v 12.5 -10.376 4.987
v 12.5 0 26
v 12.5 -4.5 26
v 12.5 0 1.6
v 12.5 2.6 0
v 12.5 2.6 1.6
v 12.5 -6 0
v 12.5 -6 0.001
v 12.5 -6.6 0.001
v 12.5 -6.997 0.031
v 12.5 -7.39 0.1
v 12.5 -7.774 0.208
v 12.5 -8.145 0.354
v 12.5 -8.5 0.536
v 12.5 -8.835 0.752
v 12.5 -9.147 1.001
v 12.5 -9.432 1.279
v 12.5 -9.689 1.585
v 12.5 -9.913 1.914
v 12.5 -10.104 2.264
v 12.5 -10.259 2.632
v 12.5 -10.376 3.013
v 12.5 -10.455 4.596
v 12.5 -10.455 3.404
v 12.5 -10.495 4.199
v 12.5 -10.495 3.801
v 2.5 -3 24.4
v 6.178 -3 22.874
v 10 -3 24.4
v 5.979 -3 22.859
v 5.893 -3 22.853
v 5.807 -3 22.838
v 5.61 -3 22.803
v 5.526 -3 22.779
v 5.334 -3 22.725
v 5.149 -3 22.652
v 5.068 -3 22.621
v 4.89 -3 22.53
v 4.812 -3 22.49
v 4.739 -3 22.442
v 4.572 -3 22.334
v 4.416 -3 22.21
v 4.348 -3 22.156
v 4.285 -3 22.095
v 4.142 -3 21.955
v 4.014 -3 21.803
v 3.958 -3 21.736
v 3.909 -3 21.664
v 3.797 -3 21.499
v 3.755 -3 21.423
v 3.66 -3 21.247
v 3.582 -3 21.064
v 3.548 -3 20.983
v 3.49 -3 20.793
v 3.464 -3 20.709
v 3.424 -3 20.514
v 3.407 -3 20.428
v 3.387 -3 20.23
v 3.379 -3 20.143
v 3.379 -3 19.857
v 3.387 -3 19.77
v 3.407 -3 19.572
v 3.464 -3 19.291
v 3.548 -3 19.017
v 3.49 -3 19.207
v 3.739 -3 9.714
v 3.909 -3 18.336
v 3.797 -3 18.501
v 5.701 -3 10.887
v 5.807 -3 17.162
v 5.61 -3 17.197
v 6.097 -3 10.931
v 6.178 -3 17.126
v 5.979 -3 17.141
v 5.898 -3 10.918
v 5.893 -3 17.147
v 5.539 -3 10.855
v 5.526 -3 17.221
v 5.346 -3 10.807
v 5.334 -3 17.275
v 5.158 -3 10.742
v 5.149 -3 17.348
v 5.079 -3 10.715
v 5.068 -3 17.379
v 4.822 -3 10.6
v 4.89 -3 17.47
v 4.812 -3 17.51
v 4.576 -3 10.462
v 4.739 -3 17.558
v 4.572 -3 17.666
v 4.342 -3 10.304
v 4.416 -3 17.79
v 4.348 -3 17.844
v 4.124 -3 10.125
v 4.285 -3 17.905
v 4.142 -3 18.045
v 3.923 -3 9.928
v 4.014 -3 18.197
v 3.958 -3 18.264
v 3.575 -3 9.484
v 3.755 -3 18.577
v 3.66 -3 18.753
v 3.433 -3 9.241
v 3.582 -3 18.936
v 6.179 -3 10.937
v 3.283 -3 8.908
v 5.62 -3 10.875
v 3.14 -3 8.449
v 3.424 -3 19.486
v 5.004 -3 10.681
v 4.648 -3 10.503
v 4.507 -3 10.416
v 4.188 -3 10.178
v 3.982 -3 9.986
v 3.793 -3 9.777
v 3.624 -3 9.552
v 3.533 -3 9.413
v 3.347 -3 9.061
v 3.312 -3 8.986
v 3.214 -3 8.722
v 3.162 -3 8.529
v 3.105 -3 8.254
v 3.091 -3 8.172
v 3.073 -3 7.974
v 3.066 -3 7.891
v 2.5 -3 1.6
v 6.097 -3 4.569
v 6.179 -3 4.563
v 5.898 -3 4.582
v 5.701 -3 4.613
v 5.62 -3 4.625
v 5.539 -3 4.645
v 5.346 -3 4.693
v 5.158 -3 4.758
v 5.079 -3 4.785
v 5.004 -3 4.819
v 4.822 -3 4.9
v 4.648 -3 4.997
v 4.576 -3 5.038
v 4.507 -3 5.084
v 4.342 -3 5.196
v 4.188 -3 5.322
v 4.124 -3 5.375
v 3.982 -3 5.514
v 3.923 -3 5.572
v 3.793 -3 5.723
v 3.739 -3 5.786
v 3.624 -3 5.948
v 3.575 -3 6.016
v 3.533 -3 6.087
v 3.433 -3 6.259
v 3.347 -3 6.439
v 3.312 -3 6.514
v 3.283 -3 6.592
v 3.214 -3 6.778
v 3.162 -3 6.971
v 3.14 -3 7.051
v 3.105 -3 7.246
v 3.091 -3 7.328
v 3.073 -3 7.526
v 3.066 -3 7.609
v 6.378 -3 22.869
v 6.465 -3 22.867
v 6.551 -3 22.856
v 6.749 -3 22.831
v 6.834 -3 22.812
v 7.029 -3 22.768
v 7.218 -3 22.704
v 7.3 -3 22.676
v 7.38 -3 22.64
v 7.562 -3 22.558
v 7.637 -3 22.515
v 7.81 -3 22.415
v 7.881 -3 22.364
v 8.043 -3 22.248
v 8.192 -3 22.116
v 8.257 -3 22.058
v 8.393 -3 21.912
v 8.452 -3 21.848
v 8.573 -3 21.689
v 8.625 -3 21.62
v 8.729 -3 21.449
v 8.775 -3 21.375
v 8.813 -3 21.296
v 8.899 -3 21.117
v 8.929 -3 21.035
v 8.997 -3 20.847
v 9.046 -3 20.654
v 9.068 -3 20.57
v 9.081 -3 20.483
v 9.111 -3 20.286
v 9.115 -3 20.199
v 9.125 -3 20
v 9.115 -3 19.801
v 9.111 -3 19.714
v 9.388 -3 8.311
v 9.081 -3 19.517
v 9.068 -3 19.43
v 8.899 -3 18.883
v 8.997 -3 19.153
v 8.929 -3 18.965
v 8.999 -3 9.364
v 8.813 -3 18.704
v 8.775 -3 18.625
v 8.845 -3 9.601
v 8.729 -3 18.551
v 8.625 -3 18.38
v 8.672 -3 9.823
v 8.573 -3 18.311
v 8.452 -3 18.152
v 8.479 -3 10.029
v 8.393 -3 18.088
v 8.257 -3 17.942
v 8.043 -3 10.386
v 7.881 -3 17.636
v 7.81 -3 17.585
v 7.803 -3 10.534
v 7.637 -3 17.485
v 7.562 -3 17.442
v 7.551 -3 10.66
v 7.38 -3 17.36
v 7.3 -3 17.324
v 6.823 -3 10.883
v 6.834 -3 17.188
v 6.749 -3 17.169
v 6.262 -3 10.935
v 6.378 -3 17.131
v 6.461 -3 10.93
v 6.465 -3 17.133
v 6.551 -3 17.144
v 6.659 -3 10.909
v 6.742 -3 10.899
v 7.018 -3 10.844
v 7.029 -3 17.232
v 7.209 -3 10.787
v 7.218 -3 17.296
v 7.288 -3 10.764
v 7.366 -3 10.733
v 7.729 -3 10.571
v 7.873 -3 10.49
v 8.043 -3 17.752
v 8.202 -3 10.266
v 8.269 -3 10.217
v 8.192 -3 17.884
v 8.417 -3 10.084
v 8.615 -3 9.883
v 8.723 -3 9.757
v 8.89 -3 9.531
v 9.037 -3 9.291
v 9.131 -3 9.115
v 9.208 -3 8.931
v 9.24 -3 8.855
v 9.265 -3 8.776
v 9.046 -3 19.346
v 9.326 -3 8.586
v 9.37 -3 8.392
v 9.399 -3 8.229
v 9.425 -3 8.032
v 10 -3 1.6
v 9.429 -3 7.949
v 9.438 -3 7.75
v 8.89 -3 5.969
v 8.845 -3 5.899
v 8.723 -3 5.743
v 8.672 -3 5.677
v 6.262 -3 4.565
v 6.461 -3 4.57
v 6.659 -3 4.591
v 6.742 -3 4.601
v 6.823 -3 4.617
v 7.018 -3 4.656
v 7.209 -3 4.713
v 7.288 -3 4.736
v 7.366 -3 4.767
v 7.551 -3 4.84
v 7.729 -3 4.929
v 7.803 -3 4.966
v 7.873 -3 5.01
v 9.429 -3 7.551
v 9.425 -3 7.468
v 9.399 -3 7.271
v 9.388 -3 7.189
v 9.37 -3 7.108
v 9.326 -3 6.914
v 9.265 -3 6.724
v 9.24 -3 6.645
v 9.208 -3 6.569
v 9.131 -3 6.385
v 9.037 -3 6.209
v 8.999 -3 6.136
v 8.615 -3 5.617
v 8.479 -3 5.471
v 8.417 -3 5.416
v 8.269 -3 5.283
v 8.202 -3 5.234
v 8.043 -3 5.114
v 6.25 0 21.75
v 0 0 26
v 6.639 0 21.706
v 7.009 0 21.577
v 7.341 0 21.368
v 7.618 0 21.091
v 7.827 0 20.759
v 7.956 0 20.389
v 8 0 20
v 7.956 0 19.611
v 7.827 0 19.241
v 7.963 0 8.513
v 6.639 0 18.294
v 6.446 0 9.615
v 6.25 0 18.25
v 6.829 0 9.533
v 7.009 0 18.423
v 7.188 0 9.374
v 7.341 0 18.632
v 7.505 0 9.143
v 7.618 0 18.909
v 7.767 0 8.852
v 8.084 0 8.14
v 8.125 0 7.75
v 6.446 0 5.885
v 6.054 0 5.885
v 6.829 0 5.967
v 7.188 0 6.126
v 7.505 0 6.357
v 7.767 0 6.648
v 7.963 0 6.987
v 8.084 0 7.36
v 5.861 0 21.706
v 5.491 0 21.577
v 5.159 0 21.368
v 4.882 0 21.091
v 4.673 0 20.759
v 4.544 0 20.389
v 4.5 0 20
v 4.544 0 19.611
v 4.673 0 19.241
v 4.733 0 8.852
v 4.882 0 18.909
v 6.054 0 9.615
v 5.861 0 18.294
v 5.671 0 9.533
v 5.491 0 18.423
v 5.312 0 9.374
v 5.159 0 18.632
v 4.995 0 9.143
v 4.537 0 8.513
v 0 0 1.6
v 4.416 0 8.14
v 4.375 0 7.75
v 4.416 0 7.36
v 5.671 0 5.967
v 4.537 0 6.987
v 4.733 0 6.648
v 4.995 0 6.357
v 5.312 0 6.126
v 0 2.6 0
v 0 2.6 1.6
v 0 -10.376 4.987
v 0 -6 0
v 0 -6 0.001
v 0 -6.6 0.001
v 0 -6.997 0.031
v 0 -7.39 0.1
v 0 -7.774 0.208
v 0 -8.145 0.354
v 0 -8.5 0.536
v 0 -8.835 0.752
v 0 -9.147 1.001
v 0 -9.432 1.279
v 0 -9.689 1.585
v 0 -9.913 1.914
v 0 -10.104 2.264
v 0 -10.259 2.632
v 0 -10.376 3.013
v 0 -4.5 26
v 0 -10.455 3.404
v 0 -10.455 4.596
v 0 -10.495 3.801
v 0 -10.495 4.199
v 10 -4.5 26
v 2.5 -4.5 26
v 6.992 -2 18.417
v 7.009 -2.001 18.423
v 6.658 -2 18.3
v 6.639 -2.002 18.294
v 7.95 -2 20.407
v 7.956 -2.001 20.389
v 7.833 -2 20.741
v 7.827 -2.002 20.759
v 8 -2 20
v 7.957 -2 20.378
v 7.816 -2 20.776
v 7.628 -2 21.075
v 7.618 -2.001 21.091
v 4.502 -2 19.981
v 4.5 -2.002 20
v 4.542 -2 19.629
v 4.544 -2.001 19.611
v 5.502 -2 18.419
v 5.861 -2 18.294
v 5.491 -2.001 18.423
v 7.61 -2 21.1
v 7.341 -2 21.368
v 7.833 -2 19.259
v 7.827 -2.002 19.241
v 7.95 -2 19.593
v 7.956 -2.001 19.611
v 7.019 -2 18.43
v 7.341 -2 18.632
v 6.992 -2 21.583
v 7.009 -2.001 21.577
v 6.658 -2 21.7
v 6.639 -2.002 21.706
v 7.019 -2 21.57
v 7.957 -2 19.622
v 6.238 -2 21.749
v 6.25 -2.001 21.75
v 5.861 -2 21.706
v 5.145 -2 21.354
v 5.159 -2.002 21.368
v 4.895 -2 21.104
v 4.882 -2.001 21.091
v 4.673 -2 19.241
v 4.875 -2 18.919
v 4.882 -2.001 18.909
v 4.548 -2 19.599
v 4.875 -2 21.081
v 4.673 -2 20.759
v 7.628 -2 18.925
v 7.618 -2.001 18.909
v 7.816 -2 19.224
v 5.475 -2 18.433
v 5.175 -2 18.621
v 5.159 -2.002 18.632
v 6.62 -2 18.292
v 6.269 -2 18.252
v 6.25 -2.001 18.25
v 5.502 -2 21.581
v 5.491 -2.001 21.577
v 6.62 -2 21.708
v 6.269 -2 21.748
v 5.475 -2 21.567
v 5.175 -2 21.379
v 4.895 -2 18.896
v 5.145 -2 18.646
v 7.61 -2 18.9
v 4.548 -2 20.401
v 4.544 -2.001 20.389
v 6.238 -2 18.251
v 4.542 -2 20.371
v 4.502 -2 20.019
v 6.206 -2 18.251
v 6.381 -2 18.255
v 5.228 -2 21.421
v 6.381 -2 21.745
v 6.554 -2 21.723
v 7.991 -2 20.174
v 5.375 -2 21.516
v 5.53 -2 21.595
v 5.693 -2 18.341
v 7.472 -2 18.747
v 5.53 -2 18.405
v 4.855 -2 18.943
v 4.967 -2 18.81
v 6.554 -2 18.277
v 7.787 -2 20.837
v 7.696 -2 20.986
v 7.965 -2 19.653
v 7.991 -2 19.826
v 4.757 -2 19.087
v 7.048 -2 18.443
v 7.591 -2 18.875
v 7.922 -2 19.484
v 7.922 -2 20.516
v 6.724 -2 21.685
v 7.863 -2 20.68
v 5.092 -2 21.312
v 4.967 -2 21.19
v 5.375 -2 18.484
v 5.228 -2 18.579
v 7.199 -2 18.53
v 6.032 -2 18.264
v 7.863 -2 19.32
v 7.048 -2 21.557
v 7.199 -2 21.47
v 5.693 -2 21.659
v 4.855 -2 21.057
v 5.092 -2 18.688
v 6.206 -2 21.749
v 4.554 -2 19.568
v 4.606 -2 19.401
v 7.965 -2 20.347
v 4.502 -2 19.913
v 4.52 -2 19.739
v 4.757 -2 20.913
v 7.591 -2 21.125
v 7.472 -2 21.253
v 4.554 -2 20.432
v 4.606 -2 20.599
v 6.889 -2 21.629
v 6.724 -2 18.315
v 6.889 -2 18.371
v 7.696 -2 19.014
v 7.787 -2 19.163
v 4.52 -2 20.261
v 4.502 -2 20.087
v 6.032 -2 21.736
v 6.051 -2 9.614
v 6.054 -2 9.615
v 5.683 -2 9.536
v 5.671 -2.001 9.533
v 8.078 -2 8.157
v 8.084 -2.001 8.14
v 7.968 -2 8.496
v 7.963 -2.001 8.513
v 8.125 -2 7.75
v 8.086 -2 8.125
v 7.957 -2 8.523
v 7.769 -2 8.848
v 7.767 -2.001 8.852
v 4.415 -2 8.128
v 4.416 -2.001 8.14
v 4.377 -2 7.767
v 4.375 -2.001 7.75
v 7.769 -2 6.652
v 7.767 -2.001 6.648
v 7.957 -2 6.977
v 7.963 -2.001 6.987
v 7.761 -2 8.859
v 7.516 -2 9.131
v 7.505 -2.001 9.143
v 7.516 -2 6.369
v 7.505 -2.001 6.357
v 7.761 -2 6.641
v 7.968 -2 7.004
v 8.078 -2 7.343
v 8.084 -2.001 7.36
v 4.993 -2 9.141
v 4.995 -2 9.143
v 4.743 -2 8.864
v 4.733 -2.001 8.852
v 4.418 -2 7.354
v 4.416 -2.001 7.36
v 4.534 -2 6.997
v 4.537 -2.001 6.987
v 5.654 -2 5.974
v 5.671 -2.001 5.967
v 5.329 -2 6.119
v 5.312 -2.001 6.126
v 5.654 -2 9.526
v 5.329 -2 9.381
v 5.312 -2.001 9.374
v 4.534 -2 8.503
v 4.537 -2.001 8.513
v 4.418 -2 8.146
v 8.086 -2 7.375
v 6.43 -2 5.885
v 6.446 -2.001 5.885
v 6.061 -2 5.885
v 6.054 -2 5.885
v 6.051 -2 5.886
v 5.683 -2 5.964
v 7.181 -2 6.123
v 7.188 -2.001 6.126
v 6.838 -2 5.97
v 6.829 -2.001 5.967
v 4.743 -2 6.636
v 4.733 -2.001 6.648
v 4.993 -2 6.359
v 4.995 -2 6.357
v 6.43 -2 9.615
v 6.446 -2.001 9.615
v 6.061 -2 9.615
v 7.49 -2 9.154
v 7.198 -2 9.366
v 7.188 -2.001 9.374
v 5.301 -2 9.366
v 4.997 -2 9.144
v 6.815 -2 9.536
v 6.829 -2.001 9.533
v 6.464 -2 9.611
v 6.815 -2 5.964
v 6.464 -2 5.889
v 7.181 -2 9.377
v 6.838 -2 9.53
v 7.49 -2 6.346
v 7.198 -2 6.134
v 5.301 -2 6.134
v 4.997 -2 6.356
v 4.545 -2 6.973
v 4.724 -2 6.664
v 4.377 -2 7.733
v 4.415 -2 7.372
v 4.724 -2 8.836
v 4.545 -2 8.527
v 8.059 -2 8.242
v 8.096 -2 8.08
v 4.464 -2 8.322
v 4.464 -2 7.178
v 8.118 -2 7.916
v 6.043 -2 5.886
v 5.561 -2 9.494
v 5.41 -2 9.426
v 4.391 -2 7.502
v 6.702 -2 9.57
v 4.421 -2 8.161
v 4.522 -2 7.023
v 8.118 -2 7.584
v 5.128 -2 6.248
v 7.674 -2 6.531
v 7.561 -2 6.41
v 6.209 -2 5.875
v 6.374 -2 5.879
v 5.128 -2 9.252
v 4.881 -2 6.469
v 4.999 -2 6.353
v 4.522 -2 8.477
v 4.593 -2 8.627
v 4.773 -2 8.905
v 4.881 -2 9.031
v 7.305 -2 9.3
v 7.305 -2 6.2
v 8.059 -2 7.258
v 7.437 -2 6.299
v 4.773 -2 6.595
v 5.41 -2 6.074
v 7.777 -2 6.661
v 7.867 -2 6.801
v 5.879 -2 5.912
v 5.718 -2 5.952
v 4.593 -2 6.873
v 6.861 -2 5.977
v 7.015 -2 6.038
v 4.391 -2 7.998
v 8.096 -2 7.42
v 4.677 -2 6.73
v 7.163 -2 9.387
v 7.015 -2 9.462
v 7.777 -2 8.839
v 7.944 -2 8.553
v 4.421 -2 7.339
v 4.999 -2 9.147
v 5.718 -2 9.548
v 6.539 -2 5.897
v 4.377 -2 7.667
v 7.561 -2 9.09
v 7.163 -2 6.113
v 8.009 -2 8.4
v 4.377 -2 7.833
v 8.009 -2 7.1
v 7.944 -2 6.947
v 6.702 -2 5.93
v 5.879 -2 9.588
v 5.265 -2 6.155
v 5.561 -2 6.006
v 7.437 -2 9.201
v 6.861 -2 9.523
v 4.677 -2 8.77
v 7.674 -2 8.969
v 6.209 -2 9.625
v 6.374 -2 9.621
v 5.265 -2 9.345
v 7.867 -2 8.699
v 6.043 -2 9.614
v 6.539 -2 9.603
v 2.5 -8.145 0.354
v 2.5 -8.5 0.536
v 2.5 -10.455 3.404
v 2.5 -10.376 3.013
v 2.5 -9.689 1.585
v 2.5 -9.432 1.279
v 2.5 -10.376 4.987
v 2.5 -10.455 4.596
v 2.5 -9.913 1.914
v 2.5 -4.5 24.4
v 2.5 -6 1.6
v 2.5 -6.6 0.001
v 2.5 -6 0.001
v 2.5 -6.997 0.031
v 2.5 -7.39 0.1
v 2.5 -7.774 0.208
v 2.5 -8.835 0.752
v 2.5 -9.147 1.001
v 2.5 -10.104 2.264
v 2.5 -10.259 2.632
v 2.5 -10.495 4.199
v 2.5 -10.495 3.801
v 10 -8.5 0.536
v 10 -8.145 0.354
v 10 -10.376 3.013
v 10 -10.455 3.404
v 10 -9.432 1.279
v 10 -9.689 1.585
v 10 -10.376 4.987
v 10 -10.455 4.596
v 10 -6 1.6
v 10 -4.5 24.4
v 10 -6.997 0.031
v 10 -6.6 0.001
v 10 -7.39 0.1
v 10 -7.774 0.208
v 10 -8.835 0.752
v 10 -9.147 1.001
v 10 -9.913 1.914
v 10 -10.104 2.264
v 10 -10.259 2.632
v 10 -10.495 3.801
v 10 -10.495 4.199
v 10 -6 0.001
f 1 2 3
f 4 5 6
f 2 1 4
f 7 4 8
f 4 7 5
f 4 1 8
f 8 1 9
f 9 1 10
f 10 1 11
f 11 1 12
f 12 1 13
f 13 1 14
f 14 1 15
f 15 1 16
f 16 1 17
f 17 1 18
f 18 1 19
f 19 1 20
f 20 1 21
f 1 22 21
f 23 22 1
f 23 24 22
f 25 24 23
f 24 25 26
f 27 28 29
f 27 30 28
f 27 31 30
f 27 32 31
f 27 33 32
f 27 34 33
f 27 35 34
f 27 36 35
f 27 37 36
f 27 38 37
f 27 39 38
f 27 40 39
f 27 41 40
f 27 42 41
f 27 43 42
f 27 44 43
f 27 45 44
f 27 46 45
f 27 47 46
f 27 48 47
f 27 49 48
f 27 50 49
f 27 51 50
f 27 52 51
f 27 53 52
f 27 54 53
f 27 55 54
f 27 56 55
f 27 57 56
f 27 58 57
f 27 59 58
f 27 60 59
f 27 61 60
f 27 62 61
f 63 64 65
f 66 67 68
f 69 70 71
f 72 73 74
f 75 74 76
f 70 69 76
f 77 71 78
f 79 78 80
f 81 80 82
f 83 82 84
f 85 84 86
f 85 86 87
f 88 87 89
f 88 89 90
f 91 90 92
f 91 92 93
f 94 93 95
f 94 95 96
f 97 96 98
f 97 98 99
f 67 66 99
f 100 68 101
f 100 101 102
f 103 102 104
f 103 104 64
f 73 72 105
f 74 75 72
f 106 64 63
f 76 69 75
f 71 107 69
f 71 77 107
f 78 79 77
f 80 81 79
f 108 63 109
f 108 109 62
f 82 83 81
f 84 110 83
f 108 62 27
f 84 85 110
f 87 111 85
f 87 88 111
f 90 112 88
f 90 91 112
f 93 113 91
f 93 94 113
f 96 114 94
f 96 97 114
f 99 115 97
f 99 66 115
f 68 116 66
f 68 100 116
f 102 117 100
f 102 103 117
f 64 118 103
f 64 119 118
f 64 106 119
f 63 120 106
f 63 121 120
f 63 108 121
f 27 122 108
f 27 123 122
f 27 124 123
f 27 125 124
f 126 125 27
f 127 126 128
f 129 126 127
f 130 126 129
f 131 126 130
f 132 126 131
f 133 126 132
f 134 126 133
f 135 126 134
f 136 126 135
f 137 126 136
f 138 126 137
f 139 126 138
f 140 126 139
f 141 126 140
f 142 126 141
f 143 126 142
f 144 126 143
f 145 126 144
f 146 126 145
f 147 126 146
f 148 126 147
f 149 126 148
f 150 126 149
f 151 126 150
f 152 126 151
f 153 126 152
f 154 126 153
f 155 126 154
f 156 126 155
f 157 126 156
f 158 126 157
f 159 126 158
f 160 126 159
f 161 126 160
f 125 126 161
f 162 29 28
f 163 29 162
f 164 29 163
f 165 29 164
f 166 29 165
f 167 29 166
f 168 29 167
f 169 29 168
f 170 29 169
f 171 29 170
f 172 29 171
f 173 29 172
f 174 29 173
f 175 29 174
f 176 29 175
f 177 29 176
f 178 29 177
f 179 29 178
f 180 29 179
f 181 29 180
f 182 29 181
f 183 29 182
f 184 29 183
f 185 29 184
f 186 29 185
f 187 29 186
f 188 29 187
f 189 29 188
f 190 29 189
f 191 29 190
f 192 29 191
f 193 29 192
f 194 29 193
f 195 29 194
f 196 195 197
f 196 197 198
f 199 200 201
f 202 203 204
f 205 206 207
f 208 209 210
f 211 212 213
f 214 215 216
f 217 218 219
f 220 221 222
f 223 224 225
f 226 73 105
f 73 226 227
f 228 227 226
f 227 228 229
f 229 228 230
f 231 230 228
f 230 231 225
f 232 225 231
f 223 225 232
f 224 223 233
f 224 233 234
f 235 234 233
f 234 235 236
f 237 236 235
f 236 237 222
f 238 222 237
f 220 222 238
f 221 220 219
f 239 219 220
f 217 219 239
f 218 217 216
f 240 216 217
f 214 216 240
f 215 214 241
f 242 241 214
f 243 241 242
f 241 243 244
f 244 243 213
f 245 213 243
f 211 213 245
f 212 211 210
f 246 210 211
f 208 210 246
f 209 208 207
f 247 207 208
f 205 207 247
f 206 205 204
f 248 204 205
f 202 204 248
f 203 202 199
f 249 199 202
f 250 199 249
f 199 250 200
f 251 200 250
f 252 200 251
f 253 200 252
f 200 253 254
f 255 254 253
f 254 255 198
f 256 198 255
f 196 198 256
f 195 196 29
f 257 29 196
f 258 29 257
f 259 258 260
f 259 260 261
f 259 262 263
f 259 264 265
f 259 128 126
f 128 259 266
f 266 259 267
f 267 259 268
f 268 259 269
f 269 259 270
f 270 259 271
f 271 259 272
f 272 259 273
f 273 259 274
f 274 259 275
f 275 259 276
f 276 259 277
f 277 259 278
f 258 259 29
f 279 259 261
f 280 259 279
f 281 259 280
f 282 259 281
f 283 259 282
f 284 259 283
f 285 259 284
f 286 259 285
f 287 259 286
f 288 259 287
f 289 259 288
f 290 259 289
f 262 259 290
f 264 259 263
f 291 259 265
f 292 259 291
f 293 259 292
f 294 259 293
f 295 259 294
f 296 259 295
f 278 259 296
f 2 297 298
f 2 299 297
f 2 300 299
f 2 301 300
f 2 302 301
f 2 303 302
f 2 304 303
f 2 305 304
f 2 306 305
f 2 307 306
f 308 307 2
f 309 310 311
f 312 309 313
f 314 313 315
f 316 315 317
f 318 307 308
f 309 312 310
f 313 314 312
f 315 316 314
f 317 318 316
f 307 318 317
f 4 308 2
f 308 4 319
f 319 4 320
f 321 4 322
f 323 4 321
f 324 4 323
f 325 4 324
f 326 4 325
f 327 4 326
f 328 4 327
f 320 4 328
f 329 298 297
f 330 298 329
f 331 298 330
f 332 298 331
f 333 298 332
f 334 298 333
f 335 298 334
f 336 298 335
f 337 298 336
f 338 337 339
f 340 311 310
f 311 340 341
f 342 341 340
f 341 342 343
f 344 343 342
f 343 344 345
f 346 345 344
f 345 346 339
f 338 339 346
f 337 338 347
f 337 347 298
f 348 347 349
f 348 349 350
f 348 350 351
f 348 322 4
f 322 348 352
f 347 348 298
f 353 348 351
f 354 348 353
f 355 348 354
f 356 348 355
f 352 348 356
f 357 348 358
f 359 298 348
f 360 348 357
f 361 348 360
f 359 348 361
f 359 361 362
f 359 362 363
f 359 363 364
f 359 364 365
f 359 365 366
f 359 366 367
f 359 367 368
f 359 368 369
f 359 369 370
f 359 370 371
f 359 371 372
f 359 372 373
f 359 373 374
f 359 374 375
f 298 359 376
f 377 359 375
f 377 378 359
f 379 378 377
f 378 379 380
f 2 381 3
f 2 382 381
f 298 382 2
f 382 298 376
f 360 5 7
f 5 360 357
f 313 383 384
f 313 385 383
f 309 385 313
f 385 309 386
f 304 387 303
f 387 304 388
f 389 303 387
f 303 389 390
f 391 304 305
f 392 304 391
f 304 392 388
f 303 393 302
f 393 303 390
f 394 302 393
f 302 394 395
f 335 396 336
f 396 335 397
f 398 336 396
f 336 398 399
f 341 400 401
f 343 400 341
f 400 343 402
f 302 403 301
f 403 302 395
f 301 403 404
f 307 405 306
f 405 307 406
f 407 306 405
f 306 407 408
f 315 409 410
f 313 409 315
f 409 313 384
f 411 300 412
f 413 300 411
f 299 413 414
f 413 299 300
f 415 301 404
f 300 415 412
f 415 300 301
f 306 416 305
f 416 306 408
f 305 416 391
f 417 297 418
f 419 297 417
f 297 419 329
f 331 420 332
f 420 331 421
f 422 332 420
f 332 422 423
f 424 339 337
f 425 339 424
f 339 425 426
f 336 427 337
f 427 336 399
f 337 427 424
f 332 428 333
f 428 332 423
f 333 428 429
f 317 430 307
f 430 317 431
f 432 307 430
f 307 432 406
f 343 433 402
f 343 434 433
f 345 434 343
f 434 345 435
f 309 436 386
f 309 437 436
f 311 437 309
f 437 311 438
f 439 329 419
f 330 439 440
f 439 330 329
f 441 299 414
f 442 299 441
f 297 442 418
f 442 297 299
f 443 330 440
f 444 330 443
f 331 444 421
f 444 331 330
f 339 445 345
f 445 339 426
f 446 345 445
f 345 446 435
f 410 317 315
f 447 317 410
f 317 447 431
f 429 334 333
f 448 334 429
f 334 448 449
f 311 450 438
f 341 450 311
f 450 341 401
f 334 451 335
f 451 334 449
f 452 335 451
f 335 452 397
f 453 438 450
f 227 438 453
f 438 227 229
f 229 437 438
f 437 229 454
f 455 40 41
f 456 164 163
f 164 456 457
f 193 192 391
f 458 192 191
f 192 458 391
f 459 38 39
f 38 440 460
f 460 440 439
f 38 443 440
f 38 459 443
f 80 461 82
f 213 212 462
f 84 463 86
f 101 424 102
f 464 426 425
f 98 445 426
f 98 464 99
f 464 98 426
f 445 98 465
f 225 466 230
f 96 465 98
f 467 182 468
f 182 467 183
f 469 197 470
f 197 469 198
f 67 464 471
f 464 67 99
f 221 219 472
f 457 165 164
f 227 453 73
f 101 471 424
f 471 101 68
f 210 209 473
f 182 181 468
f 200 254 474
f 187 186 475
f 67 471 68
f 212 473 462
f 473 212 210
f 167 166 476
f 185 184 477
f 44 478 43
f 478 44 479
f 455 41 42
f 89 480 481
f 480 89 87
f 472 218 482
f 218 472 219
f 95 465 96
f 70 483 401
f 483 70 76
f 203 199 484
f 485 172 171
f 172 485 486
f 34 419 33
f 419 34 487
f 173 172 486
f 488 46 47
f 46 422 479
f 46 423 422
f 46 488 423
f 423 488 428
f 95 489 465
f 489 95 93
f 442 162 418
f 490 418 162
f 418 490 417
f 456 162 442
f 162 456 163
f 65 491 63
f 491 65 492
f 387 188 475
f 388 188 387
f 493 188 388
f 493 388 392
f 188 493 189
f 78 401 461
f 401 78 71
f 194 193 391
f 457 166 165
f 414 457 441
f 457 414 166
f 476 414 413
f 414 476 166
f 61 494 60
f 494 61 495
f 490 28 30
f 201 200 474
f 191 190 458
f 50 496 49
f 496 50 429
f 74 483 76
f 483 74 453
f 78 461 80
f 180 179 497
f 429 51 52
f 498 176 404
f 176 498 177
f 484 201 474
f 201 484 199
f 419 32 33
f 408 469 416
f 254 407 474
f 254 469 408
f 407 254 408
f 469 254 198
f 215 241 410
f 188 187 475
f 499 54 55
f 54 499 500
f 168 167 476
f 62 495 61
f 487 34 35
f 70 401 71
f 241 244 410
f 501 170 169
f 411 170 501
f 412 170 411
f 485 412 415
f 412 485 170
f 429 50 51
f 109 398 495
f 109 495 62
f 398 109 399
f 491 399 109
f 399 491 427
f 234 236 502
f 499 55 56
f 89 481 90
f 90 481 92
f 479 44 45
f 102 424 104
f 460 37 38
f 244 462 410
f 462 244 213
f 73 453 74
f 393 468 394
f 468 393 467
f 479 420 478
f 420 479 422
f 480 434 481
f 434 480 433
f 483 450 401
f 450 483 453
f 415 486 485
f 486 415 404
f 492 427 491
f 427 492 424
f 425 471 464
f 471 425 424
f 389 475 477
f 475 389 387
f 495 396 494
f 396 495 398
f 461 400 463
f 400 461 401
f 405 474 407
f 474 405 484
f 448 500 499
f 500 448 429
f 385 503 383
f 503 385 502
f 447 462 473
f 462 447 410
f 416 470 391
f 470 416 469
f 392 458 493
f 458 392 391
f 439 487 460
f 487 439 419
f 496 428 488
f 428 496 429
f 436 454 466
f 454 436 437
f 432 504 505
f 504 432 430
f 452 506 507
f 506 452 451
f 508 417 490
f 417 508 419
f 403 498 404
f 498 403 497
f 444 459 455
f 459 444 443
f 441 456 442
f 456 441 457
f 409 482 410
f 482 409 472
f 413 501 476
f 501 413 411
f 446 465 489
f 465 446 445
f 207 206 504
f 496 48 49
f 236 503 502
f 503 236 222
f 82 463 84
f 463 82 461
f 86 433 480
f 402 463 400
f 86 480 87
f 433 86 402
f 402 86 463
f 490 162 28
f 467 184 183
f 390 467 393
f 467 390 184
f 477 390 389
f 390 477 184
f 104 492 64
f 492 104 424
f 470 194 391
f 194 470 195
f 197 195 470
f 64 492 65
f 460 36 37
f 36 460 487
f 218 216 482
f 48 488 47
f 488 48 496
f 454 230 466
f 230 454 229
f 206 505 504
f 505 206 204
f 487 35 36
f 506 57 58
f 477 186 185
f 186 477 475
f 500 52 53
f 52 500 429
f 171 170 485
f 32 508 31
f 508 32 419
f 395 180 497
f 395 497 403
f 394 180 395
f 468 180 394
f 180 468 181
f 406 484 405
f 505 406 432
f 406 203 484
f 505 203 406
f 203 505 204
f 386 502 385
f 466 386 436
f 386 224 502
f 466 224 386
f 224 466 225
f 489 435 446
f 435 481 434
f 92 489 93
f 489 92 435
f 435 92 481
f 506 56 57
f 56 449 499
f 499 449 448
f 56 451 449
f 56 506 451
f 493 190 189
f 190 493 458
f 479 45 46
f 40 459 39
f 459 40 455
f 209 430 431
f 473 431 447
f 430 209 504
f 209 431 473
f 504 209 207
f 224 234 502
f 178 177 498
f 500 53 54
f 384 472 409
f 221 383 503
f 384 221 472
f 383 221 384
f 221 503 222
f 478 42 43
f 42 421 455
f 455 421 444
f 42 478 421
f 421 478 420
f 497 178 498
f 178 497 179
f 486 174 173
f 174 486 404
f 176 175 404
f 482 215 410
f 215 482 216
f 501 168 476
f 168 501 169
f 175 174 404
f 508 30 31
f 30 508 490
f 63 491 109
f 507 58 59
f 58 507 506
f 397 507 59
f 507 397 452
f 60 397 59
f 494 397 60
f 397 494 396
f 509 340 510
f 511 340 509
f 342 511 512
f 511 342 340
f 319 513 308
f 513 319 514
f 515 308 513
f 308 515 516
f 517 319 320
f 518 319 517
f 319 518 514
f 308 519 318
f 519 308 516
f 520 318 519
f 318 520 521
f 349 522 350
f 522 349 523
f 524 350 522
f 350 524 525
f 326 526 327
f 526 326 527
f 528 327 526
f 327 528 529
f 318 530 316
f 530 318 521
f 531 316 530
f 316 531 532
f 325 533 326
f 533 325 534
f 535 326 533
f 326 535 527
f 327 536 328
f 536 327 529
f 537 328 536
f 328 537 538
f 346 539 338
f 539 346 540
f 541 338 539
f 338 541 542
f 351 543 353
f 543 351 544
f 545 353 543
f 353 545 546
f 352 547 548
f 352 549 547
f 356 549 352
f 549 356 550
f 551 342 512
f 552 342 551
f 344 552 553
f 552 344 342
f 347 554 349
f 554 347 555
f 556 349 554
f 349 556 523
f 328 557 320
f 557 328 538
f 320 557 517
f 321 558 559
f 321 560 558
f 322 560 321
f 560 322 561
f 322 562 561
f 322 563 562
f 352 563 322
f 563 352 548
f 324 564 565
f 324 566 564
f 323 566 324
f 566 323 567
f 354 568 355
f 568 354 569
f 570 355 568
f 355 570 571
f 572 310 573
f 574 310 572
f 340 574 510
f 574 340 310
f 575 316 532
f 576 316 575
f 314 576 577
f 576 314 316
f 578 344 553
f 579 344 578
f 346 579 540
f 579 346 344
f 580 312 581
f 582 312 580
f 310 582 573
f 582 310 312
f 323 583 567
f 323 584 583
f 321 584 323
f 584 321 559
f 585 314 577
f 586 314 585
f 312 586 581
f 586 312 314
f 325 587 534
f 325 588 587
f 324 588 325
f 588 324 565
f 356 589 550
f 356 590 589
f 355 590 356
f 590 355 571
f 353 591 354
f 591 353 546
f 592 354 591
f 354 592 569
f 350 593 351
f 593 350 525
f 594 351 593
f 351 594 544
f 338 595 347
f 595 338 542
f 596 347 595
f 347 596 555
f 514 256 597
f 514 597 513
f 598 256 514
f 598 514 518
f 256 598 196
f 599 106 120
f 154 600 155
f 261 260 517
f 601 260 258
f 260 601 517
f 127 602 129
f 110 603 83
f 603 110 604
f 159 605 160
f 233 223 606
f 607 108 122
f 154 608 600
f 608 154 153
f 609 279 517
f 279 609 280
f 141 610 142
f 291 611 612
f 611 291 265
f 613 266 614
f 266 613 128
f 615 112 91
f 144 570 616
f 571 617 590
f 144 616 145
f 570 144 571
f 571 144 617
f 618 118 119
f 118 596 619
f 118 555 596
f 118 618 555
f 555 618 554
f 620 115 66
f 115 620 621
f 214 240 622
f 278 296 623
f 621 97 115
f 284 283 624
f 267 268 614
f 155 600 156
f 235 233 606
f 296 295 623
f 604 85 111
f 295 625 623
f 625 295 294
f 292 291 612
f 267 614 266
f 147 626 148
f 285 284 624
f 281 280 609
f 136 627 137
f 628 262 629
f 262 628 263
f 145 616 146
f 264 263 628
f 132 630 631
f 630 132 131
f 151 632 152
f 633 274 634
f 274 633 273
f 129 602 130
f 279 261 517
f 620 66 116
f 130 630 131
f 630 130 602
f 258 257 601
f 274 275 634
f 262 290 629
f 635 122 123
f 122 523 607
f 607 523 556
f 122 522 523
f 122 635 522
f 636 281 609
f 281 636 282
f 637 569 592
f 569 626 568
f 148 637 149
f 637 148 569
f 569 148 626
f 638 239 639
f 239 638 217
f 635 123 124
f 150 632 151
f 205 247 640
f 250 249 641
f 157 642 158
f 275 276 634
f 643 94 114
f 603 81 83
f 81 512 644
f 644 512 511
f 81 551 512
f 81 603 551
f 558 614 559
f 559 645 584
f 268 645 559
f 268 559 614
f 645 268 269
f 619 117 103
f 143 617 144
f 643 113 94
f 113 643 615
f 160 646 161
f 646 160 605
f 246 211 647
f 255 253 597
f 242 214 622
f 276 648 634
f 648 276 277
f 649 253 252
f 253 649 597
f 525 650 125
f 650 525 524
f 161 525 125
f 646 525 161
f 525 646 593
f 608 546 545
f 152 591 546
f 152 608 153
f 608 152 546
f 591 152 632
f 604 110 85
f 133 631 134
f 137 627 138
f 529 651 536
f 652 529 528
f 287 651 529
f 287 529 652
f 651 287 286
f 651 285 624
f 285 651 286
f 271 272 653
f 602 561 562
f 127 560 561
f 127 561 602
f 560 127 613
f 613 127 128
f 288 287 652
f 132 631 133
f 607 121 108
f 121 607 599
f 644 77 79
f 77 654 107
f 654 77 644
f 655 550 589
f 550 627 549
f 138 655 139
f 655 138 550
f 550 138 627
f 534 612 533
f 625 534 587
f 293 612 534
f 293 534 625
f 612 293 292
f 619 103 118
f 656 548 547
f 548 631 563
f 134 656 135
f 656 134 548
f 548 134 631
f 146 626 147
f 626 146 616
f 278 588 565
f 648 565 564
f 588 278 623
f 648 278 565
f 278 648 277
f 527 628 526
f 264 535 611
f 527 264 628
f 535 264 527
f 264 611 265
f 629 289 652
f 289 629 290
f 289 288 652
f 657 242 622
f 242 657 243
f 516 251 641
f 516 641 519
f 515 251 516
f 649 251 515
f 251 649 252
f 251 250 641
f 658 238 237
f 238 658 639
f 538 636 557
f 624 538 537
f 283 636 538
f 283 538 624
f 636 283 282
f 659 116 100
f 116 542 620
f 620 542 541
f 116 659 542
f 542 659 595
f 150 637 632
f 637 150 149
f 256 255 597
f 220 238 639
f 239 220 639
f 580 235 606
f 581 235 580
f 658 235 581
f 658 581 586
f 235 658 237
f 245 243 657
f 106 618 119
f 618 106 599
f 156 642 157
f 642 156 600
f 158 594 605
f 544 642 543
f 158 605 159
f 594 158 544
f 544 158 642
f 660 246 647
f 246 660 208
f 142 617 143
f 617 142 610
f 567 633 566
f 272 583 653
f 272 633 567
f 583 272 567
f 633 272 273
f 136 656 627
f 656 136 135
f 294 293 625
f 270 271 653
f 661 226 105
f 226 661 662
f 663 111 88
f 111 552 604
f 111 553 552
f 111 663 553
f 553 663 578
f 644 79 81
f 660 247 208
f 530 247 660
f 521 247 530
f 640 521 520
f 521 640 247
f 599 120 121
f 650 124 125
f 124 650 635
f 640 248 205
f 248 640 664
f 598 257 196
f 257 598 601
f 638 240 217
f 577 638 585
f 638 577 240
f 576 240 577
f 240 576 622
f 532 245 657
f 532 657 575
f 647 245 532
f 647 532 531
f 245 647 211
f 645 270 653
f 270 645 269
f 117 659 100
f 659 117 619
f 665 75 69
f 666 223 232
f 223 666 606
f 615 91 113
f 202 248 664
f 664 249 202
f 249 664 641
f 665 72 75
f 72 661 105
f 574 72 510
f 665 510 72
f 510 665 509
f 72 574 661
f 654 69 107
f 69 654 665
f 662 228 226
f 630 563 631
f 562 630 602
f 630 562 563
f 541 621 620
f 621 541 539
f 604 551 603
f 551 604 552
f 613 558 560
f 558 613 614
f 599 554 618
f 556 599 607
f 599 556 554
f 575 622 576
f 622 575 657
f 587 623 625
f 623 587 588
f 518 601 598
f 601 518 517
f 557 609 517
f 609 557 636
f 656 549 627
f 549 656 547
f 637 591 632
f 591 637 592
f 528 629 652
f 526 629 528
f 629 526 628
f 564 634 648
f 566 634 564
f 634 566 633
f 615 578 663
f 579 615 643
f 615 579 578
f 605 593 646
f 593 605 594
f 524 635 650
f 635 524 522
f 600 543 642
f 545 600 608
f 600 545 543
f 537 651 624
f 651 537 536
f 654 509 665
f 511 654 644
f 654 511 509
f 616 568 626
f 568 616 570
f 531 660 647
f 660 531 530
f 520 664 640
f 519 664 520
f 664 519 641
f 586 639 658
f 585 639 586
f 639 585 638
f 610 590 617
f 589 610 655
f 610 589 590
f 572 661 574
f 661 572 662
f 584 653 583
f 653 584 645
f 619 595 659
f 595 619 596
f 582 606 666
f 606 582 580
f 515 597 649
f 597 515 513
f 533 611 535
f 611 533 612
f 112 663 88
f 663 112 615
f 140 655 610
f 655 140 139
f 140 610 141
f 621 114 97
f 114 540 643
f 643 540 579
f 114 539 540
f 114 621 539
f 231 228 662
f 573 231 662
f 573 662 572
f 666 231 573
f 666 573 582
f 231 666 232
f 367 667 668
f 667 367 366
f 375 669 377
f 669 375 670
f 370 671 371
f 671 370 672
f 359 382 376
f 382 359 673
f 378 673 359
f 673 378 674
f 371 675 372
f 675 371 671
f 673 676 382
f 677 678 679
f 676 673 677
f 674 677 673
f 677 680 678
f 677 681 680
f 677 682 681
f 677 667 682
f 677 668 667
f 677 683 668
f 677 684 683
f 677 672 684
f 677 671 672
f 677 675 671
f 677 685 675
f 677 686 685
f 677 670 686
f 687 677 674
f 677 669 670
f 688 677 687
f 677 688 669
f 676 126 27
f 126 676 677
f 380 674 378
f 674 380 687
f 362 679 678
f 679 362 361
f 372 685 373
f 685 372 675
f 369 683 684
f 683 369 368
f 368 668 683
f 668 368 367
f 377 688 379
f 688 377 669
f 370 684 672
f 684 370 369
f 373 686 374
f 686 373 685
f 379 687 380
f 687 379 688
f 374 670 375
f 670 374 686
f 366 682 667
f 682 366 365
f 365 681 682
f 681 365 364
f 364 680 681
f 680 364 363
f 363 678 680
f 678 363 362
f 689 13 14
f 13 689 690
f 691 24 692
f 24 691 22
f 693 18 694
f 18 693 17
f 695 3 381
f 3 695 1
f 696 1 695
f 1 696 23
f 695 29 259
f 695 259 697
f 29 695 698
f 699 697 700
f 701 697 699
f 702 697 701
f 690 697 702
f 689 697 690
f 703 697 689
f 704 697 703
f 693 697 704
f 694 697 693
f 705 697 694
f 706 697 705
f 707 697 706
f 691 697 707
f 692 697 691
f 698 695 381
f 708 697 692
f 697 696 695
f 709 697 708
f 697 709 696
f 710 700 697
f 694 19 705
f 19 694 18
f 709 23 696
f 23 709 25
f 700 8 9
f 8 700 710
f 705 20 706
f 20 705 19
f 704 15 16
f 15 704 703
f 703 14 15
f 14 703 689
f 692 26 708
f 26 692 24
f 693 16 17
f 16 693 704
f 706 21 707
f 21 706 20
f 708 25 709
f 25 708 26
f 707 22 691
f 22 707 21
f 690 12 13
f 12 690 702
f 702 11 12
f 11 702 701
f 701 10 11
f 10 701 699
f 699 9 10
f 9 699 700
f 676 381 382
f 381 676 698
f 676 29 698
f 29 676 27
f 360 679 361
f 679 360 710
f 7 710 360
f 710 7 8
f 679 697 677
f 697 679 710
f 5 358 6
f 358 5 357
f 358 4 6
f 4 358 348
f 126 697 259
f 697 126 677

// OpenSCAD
$fa=1;
$fs=0.4;
 
// base
module base()
{
    cube([12.5, 26, 3], center=false);
}

// side wall
module side_wall()
{
    hull(){
        cube([2.5, 26, 4.5], center=false);
        translate([0,4,12.5-2-4])
        rotate([0,90,0])
            cylinder(r=4, 2.5);
    }
}

module basic_edge(length=4.5)
{
    cube([12.5,1.6,length],center=false);
}

module protector()
{
    difference(){
        base();
        // holes
        //  hole 1
        translate([6.25,26-6,-.25])
            cylinder(r=3.5/2, 3.5);
        //  hole 1 chamfer
        translate([6.25,26-6,2])
            cylinder(r1=3.5/2, r2=8/2, 2);
        //  hole 2
        translate([6.25,26-18.25,-.25])
            cylinder(r=3.75/2, 3.5);
        //  hole2 chamfer
        translate([6.25,26-18.25,2])
            cylinder(r1=3.75/2, r2=9/2, 2);
    }
    side_wall();
    translate([10,0,0])
        side_wall();
    // front edge
    translate([0,26-1.6,0])
        basic_edge(4.5);
    // rear overhang
    translate([0,0,-2.6])
        basic_edge(8.6);

}

rotate([90,0,0])
    protector();
